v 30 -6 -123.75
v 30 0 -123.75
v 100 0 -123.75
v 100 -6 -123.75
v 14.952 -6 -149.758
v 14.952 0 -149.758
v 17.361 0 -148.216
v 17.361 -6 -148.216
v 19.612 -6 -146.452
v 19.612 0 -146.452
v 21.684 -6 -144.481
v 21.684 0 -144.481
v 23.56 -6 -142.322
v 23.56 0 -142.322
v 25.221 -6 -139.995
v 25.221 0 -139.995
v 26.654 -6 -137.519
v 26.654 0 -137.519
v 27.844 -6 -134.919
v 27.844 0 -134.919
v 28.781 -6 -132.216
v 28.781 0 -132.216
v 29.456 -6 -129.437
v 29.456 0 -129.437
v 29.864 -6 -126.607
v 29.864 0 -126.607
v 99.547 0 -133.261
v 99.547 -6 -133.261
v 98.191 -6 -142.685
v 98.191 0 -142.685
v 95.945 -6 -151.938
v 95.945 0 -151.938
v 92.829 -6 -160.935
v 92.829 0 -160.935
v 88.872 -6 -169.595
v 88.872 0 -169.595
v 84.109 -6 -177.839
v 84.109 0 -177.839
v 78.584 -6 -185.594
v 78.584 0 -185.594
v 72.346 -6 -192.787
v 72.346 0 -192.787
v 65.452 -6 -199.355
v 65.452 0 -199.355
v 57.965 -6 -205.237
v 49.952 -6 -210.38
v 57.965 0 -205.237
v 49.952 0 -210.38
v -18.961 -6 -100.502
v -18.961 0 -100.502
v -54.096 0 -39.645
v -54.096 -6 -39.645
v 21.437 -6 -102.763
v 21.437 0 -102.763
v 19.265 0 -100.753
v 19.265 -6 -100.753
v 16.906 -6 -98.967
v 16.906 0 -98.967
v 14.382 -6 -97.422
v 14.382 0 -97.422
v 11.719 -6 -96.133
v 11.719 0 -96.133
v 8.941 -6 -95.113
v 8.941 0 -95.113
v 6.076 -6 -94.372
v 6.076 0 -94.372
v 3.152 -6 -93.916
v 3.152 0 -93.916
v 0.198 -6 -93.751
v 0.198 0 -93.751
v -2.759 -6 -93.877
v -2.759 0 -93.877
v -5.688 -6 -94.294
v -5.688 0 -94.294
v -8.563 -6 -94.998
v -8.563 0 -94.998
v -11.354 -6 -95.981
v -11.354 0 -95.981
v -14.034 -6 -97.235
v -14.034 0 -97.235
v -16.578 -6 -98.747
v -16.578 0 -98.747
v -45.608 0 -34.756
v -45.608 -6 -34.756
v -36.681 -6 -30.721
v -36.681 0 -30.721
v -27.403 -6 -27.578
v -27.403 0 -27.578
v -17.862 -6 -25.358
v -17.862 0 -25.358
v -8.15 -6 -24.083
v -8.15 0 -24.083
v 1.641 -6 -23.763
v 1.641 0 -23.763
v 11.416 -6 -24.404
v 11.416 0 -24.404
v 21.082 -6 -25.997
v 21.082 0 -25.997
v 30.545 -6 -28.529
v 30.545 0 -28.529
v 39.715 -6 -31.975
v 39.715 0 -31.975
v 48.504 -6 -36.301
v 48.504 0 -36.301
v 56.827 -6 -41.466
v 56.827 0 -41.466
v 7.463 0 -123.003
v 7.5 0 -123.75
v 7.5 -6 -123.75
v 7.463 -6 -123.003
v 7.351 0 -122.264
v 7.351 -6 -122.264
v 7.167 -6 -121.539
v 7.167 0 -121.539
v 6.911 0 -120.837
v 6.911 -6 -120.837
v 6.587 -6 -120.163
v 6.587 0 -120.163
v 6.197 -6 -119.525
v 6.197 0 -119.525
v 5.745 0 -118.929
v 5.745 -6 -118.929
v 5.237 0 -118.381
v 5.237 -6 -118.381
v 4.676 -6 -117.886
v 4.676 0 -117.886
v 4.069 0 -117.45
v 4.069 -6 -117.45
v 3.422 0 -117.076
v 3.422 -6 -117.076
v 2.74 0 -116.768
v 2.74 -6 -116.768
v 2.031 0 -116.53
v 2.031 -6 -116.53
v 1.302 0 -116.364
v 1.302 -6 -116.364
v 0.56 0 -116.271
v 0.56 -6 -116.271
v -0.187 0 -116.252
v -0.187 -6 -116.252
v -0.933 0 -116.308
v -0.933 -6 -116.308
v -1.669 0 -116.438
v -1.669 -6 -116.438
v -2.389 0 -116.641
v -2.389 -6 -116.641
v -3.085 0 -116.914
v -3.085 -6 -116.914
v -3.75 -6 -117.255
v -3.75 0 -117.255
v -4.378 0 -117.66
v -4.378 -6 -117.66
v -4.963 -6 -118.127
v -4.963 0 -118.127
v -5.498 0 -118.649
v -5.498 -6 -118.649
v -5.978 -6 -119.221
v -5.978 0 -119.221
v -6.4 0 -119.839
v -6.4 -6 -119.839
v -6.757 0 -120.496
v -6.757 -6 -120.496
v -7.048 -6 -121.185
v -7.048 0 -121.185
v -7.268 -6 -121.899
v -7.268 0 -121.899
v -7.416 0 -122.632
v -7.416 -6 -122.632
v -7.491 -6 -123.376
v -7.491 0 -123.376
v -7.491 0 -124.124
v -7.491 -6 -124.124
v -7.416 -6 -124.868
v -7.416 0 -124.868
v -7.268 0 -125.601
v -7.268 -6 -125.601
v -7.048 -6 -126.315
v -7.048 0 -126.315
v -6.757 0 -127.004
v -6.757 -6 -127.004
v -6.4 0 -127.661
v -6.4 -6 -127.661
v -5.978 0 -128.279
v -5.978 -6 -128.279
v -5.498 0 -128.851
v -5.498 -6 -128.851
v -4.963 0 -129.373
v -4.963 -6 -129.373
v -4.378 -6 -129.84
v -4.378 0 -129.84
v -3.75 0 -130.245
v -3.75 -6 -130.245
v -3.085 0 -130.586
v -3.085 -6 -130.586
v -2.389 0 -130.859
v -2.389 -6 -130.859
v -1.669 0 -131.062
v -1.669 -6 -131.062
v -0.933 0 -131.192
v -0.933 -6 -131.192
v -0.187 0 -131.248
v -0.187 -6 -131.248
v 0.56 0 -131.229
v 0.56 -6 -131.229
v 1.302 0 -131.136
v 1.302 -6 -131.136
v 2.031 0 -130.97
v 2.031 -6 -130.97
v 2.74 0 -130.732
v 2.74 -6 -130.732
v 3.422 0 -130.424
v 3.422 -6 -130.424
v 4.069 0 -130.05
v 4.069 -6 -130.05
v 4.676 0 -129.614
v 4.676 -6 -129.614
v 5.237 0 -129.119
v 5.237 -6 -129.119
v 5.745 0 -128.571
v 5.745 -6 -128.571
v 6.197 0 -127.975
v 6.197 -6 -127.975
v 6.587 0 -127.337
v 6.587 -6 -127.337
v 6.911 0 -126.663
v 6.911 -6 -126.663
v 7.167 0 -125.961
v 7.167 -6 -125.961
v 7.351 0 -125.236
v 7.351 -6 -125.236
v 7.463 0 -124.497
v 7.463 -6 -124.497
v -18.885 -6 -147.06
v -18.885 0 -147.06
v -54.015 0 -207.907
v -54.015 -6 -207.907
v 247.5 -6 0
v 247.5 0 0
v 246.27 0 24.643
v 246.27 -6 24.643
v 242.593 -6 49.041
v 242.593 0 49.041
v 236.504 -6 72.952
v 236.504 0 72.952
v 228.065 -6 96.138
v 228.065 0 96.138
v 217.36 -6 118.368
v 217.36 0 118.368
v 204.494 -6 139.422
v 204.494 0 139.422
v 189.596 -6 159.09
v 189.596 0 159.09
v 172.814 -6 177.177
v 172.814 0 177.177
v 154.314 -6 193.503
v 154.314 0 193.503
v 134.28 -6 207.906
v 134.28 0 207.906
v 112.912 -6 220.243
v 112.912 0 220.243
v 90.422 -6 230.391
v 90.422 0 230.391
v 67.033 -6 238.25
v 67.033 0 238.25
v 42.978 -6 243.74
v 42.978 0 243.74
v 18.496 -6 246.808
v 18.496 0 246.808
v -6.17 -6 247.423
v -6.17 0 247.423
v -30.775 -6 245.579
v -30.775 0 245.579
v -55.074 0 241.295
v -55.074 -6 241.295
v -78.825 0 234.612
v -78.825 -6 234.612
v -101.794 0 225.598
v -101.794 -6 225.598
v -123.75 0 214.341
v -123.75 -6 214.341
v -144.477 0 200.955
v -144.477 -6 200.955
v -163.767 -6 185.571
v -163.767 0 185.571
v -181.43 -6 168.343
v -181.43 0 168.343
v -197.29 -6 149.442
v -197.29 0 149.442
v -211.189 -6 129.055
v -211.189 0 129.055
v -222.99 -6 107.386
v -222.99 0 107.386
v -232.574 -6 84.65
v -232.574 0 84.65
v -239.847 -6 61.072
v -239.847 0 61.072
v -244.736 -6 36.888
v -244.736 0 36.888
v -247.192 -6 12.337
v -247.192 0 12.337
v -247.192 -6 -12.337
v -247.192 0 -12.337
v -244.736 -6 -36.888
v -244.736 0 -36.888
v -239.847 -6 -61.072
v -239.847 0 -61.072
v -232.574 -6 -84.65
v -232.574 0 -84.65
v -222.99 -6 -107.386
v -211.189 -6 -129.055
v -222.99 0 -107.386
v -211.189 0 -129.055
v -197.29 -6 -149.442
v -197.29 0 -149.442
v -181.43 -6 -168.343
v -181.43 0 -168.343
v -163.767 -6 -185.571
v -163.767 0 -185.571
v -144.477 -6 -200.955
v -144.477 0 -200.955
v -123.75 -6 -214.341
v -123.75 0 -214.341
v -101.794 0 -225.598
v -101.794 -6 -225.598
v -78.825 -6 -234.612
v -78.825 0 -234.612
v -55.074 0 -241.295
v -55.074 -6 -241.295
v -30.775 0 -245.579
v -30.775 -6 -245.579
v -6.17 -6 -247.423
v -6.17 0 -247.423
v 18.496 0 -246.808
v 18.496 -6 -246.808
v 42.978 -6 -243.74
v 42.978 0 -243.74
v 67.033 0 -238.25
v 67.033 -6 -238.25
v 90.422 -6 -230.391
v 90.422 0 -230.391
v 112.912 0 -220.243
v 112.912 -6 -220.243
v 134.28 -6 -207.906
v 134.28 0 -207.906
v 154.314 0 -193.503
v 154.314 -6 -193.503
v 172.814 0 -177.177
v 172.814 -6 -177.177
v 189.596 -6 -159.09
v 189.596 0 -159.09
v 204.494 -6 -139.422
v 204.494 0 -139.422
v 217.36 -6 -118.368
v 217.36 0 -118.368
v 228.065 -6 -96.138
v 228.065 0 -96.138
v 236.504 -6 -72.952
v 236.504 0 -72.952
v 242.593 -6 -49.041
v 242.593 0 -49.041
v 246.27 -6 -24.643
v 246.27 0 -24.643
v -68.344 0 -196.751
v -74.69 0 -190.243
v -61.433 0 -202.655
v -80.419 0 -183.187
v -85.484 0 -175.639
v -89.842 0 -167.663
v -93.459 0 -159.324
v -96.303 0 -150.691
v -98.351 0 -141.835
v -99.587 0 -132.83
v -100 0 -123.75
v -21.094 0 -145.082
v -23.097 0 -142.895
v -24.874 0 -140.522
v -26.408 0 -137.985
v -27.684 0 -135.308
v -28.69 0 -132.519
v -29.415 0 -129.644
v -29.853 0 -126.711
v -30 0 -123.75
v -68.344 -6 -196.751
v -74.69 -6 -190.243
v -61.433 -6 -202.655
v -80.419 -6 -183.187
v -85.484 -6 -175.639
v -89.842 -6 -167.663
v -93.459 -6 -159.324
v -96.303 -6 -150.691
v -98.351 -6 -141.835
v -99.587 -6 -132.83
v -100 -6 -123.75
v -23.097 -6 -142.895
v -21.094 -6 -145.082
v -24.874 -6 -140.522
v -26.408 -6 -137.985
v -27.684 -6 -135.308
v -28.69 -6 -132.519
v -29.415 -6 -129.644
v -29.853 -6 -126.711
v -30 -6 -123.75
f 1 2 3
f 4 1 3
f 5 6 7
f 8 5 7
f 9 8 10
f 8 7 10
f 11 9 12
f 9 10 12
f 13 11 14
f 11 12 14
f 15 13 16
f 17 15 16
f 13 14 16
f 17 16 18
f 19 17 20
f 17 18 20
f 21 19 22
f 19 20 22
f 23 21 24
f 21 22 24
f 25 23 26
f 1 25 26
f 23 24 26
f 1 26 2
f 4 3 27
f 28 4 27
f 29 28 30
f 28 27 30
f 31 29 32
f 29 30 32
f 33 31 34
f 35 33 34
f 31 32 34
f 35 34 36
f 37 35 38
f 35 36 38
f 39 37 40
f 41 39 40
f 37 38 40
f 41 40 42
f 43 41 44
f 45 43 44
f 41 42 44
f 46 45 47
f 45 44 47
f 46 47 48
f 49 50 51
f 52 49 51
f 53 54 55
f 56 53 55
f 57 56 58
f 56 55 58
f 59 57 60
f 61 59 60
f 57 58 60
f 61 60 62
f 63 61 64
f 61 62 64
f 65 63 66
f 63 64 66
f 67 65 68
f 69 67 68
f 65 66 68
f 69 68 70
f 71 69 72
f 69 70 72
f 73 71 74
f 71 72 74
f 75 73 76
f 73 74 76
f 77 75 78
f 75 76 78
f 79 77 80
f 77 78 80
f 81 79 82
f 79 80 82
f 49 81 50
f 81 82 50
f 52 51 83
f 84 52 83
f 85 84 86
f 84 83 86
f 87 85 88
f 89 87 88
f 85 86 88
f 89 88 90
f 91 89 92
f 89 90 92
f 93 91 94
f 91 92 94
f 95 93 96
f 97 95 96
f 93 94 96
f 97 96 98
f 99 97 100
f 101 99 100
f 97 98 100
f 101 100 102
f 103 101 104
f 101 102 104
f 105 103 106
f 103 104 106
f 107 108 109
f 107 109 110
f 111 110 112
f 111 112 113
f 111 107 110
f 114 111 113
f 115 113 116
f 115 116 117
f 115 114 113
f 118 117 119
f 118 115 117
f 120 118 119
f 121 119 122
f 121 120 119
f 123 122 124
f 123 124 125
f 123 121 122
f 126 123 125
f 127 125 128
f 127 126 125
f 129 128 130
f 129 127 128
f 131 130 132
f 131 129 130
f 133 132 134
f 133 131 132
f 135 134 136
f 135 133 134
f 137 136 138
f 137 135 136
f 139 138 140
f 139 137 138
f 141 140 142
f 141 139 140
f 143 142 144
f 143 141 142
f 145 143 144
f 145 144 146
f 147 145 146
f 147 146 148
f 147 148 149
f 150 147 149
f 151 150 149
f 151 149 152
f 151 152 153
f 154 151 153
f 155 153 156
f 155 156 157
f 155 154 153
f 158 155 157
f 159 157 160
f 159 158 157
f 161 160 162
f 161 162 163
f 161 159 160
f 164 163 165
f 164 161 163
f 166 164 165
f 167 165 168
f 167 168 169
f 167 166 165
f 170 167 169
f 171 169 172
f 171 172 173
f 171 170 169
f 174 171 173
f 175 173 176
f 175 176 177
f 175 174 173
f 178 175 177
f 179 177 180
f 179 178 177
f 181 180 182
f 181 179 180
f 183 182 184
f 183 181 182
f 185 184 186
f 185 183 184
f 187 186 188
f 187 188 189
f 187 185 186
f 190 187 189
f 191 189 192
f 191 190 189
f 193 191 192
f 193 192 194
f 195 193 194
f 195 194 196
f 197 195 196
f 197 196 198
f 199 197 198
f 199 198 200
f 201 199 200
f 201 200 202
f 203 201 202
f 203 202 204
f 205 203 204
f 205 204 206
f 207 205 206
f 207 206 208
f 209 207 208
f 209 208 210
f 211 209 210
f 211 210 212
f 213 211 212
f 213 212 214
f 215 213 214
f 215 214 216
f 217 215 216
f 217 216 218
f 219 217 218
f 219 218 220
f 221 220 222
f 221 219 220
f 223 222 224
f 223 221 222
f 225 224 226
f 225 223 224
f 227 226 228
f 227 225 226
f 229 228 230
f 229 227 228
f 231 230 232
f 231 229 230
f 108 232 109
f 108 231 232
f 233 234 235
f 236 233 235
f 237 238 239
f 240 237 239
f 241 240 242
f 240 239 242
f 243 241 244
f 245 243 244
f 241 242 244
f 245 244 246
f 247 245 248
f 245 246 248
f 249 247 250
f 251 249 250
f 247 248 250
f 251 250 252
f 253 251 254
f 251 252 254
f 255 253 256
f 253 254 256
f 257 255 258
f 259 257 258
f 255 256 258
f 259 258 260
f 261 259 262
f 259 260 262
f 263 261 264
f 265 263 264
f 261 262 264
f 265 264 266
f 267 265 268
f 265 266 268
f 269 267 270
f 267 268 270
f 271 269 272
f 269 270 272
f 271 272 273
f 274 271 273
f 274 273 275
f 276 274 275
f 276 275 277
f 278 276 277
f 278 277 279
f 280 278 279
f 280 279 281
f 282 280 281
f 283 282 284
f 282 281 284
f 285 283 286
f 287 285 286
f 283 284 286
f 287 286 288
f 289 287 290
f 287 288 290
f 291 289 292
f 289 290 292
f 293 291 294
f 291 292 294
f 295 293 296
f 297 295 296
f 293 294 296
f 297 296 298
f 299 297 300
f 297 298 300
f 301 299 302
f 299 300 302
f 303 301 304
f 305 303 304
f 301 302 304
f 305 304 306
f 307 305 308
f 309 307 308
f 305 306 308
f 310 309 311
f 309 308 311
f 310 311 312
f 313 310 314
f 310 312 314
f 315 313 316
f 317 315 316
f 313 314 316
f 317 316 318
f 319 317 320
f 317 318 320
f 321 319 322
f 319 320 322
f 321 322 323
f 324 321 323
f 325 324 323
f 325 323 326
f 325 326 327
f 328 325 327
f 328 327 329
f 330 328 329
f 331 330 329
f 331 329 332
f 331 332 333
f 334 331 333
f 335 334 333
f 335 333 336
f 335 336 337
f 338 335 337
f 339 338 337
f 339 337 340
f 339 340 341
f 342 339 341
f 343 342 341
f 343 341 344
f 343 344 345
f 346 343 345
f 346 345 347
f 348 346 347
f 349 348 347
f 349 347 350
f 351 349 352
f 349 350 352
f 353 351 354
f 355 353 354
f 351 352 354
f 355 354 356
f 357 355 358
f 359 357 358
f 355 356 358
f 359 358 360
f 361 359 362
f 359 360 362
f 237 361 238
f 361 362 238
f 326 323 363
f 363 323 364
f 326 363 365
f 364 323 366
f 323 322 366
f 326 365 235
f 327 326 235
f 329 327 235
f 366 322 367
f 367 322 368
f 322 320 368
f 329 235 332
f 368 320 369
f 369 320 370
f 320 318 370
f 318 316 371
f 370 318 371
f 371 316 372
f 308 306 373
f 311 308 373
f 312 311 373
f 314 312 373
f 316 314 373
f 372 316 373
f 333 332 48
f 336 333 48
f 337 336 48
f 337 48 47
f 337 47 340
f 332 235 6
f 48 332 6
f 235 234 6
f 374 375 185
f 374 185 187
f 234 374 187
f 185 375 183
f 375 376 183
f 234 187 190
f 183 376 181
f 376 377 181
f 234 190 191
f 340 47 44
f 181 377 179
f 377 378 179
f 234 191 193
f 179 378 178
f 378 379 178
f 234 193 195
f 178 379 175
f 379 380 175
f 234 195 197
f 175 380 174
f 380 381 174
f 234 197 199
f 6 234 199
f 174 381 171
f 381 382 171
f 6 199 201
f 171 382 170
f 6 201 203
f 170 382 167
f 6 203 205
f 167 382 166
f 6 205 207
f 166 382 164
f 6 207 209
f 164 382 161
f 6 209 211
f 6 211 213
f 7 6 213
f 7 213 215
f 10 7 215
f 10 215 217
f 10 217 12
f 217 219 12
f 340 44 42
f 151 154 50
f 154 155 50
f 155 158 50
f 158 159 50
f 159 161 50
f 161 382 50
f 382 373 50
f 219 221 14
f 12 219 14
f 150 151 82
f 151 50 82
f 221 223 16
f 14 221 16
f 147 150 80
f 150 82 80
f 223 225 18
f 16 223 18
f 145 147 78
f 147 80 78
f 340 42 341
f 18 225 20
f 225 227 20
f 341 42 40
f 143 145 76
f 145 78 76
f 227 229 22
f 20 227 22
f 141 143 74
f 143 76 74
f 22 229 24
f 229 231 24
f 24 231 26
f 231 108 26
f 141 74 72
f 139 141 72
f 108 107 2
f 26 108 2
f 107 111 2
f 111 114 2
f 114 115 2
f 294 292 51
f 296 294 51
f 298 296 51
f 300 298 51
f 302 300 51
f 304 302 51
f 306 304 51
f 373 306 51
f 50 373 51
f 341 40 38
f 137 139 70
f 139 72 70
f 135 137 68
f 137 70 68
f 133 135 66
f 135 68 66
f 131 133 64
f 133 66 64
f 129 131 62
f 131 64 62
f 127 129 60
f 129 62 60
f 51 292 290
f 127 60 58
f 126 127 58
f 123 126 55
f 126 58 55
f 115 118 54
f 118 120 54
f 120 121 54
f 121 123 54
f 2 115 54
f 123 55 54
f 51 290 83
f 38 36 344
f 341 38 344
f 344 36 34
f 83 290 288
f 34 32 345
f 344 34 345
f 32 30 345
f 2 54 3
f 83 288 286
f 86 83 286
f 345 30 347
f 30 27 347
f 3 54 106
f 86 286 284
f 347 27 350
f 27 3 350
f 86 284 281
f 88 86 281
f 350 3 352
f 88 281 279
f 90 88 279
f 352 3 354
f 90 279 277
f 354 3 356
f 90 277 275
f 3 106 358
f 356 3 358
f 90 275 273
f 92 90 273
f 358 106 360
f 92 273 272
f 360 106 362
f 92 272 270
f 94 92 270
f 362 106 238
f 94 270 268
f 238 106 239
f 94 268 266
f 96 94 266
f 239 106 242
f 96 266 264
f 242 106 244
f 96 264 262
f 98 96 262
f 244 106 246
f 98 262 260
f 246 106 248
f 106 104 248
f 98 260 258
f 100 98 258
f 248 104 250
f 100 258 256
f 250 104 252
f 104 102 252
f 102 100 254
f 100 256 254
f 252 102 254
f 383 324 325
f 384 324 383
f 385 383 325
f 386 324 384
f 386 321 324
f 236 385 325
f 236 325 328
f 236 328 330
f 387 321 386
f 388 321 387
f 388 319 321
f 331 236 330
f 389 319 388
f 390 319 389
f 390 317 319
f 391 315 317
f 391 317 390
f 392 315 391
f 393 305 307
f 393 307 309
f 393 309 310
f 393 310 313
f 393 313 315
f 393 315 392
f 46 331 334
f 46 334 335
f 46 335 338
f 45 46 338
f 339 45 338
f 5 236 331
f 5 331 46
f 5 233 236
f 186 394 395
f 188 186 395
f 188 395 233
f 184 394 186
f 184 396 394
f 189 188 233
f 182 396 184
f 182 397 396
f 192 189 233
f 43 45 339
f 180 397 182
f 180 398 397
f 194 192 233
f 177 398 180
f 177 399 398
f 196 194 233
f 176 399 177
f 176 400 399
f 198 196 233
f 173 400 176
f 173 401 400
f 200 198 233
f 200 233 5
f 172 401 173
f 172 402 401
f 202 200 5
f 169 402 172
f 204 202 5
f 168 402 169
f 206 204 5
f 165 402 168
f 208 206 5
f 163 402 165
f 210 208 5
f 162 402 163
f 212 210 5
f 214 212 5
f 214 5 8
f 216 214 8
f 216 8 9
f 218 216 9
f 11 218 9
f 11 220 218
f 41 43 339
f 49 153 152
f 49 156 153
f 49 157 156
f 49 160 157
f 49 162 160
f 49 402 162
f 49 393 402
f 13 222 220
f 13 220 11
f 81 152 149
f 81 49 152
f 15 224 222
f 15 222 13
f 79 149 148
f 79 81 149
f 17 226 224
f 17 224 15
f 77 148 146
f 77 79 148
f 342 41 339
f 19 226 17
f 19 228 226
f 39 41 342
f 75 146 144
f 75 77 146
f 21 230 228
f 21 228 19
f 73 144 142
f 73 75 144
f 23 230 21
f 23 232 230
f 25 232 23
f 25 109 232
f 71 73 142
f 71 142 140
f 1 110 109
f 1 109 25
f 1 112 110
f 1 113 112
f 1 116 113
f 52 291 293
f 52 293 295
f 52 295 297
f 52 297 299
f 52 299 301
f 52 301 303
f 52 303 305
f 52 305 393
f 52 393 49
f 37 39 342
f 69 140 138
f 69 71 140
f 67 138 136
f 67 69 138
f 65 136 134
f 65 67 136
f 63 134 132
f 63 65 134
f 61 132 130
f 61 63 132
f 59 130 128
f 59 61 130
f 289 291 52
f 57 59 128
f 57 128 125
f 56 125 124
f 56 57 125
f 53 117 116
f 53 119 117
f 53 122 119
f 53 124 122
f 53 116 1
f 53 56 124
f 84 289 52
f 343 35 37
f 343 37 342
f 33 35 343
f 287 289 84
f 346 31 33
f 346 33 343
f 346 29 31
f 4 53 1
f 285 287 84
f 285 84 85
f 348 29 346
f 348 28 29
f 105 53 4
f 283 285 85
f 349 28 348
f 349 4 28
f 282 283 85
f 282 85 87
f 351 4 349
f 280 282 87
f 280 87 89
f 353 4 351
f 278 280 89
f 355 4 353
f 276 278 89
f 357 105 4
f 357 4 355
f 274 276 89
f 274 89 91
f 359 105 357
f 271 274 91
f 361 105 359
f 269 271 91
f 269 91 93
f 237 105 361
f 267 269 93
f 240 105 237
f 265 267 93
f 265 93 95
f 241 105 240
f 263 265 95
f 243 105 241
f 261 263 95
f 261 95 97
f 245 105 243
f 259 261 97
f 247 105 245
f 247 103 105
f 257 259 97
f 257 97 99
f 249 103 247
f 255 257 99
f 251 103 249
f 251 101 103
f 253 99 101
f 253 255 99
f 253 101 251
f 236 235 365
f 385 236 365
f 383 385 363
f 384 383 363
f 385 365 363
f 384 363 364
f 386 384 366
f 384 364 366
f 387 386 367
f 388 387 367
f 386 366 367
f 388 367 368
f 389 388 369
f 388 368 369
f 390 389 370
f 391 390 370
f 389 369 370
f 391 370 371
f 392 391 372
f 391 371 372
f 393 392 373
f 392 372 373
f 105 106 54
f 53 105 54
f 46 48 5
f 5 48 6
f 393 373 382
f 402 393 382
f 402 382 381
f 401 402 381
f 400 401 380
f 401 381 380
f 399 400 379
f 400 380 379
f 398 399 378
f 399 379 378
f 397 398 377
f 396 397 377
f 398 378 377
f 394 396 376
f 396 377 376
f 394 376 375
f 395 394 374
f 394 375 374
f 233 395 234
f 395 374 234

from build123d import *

# Parameters (mm, degrees)
F0_R     = 247.5
F0_R_2   = 7.5
F1_DEPTH = 6


with BuildPart() as f1:
    # F0 (on Front) → F1 (new body)
    with BuildSketch(Plane.XZ):
        Circle(F0_R)
        with BuildLine():
            ThreePointArc((-54.014982, -207.906888), (-87.753912, -171.700505), (-100, -123.75))
            Line((-100, -123.75), (-30, -123.75))
            ThreePointArc((-30, -123.75), (-27.079055, -136.662194), (-18.885016, -147.060002))
            Line((-18.885016, -147.060002), (-54.014982, -207.906888))
        make_face(mode=Mode.SUBTRACT)
        with BuildLine():
            Line((30, -123.75), (100, -123.75))
            ThreePointArc((100, -123.75), (86.588738, -173.773898), (49.952192, -210.380125))
            Line((49.952192, -210.380125), (14.952174, -149.758316))
            ThreePointArc((14.952174, -149.758316), (25.966952, -138.773894), (30, -123.75))
        make_face(mode=Mode.SUBTRACT)
        with Locations((0, -123.75)):
            Circle(F0_R_2, mode=Mode.SUBTRACT)
        with BuildLine():
            Line((-18.960726, -100.50154), (-54.096123, -39.645247))
            ThreePointArc((-54.096123, -39.645247), (1.641257, -23.76347), (56.827358, -41.466032))
            Line((56.827358, -41.466032), (21.437345, -102.763332))
            ThreePointArc((21.437345, -102.763332), (1.677002, -93.796909), (-18.960726, -100.50154))
        make_face(mode=Mode.SUBTRACT)
    extrude(amount=F1_DEPTH)


solid = f1.part
